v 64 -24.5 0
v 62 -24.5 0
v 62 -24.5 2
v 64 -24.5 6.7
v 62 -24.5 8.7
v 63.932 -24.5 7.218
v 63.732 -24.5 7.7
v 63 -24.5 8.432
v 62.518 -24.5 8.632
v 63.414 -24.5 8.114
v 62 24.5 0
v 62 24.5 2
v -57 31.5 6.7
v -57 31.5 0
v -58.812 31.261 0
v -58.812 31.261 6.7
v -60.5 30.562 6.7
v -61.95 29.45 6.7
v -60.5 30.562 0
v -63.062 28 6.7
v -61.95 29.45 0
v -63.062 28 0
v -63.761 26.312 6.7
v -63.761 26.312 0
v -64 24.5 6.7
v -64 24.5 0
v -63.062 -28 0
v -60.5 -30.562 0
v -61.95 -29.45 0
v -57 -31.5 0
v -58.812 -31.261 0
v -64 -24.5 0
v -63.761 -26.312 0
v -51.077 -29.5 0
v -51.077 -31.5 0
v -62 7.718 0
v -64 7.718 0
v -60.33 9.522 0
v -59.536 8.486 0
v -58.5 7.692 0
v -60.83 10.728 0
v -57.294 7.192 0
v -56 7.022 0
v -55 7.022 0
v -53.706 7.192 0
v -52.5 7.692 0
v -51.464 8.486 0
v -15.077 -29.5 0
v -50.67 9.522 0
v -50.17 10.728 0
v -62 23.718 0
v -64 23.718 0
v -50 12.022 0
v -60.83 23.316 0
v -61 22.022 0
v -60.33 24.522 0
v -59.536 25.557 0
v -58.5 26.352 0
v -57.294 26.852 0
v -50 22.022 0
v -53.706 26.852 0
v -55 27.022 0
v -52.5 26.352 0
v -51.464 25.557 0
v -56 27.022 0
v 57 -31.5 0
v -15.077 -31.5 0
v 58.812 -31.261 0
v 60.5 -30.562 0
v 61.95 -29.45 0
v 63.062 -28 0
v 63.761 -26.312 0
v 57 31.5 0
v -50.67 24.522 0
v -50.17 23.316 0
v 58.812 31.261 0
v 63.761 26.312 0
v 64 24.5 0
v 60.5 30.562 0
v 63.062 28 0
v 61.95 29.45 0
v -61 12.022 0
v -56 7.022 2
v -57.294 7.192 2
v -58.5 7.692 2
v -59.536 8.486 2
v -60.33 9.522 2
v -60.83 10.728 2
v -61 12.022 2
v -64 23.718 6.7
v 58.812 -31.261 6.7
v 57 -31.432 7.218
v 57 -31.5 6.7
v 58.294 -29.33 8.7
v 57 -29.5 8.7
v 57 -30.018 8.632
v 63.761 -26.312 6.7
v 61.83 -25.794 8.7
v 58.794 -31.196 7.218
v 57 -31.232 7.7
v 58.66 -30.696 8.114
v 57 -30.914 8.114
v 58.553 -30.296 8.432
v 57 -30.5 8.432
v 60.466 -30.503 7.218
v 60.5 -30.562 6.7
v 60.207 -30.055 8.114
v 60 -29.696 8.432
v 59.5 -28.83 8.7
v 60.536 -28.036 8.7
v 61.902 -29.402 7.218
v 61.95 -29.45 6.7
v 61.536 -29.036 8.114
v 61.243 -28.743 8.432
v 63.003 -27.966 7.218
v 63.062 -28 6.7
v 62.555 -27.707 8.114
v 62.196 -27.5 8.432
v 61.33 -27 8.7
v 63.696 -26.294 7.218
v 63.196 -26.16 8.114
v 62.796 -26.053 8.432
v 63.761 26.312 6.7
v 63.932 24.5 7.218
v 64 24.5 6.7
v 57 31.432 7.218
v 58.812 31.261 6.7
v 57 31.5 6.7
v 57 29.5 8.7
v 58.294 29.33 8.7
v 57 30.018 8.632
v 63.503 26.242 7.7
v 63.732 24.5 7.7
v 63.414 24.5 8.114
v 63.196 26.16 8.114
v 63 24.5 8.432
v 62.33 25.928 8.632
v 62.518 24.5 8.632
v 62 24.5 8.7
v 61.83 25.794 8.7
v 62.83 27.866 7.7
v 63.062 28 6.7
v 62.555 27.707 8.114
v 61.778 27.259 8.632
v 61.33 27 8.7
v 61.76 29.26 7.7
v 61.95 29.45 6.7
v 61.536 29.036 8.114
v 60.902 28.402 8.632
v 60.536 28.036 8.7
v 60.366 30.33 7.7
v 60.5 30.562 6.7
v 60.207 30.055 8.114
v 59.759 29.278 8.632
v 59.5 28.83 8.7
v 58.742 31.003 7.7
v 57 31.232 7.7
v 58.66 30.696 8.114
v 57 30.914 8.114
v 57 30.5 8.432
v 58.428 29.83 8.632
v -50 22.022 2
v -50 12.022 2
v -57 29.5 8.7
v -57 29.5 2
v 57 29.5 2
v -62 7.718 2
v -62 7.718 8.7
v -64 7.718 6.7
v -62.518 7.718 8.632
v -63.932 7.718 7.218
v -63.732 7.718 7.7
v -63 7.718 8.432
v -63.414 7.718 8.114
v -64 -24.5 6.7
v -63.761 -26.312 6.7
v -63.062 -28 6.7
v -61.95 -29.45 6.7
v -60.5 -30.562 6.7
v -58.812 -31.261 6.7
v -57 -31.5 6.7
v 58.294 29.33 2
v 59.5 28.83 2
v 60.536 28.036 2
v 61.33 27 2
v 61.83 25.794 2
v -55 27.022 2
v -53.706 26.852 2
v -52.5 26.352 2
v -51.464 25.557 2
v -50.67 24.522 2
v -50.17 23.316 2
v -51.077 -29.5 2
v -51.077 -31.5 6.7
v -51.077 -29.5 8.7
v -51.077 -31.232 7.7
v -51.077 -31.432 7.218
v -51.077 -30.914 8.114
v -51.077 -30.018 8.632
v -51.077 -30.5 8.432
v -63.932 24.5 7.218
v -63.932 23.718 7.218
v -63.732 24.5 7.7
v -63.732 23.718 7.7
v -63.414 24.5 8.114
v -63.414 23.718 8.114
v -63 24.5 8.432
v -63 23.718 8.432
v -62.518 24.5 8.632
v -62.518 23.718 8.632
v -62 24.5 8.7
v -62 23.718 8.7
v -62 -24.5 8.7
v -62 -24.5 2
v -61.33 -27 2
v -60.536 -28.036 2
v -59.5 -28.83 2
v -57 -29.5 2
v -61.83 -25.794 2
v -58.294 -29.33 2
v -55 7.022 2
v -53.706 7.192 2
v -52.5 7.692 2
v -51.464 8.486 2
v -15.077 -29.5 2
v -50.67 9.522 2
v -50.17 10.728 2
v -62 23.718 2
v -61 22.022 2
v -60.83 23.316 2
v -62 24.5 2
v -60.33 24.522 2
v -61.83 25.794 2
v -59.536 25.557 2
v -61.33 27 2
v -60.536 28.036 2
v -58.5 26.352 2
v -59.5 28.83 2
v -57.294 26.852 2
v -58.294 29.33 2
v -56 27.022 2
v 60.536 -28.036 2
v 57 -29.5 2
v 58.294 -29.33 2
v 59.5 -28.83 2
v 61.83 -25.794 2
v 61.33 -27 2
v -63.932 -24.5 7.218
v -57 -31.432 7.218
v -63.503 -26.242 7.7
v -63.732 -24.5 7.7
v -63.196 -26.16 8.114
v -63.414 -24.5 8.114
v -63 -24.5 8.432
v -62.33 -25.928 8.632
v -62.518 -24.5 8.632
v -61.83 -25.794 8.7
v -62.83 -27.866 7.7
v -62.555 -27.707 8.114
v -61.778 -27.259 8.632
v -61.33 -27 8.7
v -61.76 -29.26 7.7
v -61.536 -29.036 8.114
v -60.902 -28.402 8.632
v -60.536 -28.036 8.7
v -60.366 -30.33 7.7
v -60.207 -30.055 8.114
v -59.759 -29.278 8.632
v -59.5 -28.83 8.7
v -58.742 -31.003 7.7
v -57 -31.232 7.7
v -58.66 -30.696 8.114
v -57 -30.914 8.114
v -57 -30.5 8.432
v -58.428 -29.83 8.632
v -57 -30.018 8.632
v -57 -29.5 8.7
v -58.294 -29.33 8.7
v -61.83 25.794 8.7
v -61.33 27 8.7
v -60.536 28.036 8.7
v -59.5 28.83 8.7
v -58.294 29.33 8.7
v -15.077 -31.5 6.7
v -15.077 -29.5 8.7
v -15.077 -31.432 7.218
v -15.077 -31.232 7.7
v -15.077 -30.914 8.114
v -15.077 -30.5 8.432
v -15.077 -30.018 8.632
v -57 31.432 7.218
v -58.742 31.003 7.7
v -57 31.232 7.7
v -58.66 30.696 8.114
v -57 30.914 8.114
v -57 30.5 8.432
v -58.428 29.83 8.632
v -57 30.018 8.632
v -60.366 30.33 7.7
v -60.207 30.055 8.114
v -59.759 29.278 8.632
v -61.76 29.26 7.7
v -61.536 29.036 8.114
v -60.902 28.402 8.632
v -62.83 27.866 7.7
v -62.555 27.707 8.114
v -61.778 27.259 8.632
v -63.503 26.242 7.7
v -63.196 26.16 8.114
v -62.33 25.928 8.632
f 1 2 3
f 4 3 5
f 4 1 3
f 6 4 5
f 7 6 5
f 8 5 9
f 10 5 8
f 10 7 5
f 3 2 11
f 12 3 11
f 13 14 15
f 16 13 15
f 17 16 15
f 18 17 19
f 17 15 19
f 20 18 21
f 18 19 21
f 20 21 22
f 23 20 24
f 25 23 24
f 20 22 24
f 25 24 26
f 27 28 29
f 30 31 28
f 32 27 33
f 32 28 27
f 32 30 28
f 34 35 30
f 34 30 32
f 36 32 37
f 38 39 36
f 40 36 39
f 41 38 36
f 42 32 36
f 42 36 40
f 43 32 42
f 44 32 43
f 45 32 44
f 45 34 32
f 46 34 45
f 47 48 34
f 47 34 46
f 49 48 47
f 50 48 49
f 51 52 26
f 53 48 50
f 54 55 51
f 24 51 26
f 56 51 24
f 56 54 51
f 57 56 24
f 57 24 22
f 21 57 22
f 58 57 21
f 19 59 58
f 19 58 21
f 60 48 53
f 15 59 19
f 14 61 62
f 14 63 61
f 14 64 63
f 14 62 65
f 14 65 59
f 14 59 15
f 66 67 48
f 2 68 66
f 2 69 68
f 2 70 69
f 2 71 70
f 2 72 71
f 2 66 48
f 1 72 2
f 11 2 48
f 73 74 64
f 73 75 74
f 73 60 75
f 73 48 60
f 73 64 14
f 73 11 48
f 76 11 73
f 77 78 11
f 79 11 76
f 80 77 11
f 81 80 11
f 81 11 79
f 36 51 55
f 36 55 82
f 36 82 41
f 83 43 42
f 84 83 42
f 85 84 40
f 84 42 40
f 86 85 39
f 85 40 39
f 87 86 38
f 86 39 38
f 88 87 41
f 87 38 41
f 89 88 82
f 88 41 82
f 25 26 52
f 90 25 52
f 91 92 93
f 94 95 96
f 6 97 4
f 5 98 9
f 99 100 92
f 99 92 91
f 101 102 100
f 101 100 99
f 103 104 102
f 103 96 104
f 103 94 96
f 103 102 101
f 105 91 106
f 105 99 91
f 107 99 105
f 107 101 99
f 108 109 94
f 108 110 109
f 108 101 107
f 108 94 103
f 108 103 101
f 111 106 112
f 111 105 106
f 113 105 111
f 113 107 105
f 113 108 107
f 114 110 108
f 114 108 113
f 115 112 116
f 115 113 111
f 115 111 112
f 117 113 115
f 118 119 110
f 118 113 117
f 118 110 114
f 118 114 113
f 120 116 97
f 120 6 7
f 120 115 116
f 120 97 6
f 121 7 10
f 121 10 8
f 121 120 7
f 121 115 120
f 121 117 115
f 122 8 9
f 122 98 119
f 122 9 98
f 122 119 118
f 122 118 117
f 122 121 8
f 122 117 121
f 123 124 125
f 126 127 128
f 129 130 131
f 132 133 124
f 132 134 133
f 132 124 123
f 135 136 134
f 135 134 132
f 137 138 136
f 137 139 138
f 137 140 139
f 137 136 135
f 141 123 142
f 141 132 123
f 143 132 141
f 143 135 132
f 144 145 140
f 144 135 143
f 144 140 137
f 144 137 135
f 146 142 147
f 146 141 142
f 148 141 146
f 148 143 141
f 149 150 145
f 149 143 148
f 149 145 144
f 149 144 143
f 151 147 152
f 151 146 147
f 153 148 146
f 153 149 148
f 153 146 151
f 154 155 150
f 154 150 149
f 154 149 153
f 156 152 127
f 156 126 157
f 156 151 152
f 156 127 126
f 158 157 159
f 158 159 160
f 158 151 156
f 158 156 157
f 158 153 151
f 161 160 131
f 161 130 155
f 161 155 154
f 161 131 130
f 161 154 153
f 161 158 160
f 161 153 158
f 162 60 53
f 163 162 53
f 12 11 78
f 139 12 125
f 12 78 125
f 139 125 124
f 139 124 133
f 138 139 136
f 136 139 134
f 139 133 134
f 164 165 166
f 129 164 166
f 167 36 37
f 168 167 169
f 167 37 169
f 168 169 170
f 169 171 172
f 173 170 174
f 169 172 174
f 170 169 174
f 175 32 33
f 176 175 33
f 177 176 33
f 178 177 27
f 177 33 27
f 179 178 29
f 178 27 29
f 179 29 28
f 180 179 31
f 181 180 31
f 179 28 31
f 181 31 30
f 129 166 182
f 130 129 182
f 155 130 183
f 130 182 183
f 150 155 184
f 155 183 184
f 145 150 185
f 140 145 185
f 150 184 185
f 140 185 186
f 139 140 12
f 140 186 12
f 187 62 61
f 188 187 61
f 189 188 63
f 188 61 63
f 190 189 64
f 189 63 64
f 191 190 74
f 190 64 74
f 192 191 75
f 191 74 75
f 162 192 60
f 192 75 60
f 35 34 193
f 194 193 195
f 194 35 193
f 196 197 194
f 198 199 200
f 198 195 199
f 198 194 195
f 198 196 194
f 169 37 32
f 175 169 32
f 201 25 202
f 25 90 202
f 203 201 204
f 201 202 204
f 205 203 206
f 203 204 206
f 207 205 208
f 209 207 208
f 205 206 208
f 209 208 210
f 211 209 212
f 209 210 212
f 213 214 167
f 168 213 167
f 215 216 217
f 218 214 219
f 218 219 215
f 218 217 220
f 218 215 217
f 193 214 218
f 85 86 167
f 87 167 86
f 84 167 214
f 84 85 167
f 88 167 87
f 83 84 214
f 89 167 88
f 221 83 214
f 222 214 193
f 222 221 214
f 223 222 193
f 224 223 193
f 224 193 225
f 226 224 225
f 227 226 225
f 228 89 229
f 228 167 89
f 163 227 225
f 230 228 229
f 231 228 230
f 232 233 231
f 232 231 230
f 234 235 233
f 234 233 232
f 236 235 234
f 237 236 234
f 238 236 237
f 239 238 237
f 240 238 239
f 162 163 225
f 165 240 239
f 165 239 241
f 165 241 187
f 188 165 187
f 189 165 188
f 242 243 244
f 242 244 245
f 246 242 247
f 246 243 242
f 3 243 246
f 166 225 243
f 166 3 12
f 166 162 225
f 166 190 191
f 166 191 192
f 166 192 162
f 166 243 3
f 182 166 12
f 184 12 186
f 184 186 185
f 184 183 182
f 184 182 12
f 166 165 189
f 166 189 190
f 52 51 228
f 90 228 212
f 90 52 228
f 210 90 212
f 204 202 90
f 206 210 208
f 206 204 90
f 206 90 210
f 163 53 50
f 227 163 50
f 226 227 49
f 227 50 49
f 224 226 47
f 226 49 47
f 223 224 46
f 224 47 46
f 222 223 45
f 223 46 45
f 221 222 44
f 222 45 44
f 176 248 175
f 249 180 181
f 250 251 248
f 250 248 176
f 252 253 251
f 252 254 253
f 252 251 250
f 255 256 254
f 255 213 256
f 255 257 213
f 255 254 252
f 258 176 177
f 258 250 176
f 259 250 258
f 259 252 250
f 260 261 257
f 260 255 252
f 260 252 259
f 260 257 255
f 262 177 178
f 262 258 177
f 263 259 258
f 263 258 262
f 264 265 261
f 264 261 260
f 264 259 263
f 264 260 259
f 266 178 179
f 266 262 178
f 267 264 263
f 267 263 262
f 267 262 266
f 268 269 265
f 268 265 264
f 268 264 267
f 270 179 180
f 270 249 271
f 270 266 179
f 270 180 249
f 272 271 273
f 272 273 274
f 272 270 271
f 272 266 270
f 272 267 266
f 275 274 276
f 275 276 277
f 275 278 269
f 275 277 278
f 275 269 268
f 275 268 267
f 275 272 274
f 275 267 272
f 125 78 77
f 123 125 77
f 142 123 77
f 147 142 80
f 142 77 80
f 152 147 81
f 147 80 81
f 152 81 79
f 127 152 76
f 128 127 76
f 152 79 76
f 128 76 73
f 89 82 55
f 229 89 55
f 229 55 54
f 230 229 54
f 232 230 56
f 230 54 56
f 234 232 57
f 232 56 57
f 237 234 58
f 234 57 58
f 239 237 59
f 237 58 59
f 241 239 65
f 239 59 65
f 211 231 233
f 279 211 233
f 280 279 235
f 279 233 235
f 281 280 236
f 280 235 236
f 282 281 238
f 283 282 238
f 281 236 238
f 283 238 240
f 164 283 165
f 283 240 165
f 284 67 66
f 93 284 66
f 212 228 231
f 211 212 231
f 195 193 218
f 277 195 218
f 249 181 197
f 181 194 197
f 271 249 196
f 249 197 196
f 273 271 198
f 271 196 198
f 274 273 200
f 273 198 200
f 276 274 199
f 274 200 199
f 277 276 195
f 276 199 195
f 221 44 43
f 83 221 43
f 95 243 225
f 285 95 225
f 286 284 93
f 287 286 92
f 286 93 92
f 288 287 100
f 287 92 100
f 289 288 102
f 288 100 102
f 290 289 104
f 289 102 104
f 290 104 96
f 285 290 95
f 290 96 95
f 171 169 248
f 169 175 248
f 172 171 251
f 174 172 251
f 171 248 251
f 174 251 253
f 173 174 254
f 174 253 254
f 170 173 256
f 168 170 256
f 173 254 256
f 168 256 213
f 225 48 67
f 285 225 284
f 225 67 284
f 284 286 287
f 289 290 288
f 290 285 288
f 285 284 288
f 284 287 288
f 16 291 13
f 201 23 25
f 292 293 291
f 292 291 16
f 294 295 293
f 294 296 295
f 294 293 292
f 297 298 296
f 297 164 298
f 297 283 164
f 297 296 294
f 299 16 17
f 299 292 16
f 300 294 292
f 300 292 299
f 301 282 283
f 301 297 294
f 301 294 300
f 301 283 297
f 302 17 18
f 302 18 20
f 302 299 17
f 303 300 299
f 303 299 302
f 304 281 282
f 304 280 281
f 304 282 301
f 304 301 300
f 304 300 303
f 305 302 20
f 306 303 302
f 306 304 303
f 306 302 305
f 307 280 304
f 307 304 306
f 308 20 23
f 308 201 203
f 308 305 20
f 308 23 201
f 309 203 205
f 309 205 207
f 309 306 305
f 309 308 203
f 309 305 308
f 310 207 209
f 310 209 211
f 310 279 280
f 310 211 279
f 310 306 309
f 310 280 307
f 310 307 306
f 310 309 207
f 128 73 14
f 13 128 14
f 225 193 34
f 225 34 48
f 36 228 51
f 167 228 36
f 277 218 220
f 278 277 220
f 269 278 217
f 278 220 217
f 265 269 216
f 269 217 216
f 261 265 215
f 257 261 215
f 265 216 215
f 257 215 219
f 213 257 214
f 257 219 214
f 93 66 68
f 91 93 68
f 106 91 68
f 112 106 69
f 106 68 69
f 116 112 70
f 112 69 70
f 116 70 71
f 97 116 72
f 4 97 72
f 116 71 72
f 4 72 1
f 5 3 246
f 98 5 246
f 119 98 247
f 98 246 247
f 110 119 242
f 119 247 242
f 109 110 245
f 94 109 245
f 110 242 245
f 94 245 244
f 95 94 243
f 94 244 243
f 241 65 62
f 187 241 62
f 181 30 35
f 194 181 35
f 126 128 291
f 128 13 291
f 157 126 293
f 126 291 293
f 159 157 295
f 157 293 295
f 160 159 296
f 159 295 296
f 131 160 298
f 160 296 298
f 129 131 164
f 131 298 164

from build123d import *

# Parameters (mm, degrees)
F1_DEPTH = 2
F2_DEPTH = 8.7
F3_W     = 36
F3_H     = 8.7
F4_DEPTH = 2
F5_DEPTH = 2
F6_DEPTH = 2
F7_DEPTH = 2
F8_W     = 16
F8_H     = 8.7
F9_DEPTH = 2
F10_R    = 1.99999
F11_R    = 1.99999


# Not quite as in the source:
# - a fillet or chamfer is up to 0.001 mm smaller than in the source, because OpenCascade refuses the exact size


with BuildPart() as f1:
    # F0 (on Top) → F1 (new body)
    with BuildSketch(Plane.XY):
        with BuildLine():
            Line((57, 29.5), (-57, 29.5))
            ThreePointArc((-57, 29.5), (-60.5355339059, 28.0355339059), (-62, 24.5))
            Line((-62, 24.5), (-62, -24.5))
            ThreePointArc((-62, -24.5), (-60.5355339059, -28.0355339059), (-57, -29.5))
            Line((-57, -29.5), (57, -29.5))
            ThreePointArc((57, -29.5), (60.5355339059, -28.0355339059), (62, -24.5))
            Line((62, -24.5), (62, 24.5))
            ThreePointArc((62, 24.5), (60.5355339059, 28.0355339059), (57, 29.5))
        make_face()
        with BuildLine():
            Line((-56, 27.021933794), (-55, 27.021933794))
            ThreePointArc((-55, 27.021933794), (-51.4644660941, 25.5574677), (-50, 22.021933794))
            Line((-50, 22.021933794), (-50, 12.021933794))
            ThreePointArc((-50, 12.021933794), (-51.4644660941, 8.4863998881), (-55, 7.021933794))
            Line((-55, 7.021933794), (-56, 7.021933794))
            ThreePointArc((-56, 7.021933794), (-59.5355339059, 8.4863998881), (-61, 12.021933794))
            Line((-61, 12.021933794), (-61, 22.021933794))
            ThreePointArc((-61, 22.021933794), (-59.5355339059, 25.5574677), (-56, 27.021933794))
        make_face(mode=Mode.SUBTRACT)
    extrude(amount=F1_DEPTH)

    # F0 (on Top) → F2 (join)
    with BuildSketch(Plane.XY):
        with BuildLine():
            Line((57, 31.5), (-57, 31.5))
            ThreePointArc((-57, 31.5), (-61.9497474683, 29.4497474683), (-64, 24.5))
            Line((-64, 24.5), (-64, -24.5))
            ThreePointArc((-64, -24.5), (-61.9497474683, -29.4497474683), (-57, -31.5))
            Line((-57, -31.5), (57, -31.5))
            ThreePointArc((57, -31.5), (61.9497474683, -29.4497474683), (64, -24.5))
            Line((64, -24.5), (64, 24.5))
            ThreePointArc((64, 24.5), (61.9497474683, 29.4497474683), (57, 31.5))
        make_face()
        with BuildLine():
            ThreePointArc((-62, 24.5), (-60.5355339059, 28.0355339059), (-57, 29.5))
            Line((-57, 29.5), (57, 29.5))
            ThreePointArc((57, 29.5), (60.5355339059, 28.0355339059), (62, 24.5))
            Line((62, 24.5), (62, -24.5))
            ThreePointArc((62, -24.5), (60.5355339059, -28.0355339059), (57, -29.5))
            Line((57, -29.5), (-57, -29.5))
            ThreePointArc((-57, -29.5), (-60.5355339059, -28.0355339059), (-62, -24.5))
            Line((-62, -24.5), (-62, 24.5))
        make_face(mode=Mode.SUBTRACT)
    extrude(amount=F2_DEPTH)

    # F3 (on face) → F4 (cut)
    with BuildSketch(Plane.XZ.offset(31.5)):
        with Locations((-33.0772541165, 4.35)):
            Rectangle(F3_W, F3_H)
    extrude(amount=-F4_DEPTH, mode=Mode.SUBTRACT)

    # F5 (add): a face of the model
    f5_faces = [f1.faces().sort_by_distance(p)[0] for p in [
        (64, 0, 4.35),
    ]]
    extrude(f5_faces, amount=-F5_DEPTH)

    # F6 (add): a face of the model
    f6_faces = [f1.faces().sort_by_distance(p)[0] for p in [
        (64, 0, 4.35),
    ]]
    extrude(f6_faces, amount=-F6_DEPTH)

    # F7 (cut): a face of the model
    f7_faces = [f1.faces().sort_by_distance(p)[0] for p in [
        (64, 0, 4.35),
    ]]
    extrude(f7_faces, amount=-F7_DEPTH, mode=Mode.SUBTRACT)

    # F8 (on face) → F9 (cut)
    with BuildSketch(Plane(origin=(-64, 0, 0), x_dir=(0, -1, 0), z_dir=(-1, 0, 0))):
        with Locations((-15.7182565033, 4.35)):
            Rectangle(F8_W, F8_H)
    extrude(amount=-F9_DEPTH, mode=Mode.SUBTRACT)

    # F10 (radius 2 in the source; OpenCascade refuses exactly that, so slightly less here)
    f10_edges = [f1.edges().sort_by_distance(p)[0] for p in [
        (61.949747, 29.449747, 8.7),
        (0, 31.5, 8.7),
        (-61.949747, 29.449747, 8.7),
    ]]
    fillet(f10_edges, radius=F10_R)

    # F11 (radius 2 in the source; OpenCascade refuses exactly that, so slightly less here)
    f11_edges = [f1.edges().sort_by_distance(p)[0] for p in [
        (-64, -8.390872, 8.7),
        (-54.038627, -31.5, 8.7),
        (-61.949747, -29.449747, 8.7),
        (20.961373, -31.5, 8.7),
        (61.949747, -29.449747, 8.7),
    ]]
    fillet(f11_edges, radius=F11_R)


solid = f1.part
